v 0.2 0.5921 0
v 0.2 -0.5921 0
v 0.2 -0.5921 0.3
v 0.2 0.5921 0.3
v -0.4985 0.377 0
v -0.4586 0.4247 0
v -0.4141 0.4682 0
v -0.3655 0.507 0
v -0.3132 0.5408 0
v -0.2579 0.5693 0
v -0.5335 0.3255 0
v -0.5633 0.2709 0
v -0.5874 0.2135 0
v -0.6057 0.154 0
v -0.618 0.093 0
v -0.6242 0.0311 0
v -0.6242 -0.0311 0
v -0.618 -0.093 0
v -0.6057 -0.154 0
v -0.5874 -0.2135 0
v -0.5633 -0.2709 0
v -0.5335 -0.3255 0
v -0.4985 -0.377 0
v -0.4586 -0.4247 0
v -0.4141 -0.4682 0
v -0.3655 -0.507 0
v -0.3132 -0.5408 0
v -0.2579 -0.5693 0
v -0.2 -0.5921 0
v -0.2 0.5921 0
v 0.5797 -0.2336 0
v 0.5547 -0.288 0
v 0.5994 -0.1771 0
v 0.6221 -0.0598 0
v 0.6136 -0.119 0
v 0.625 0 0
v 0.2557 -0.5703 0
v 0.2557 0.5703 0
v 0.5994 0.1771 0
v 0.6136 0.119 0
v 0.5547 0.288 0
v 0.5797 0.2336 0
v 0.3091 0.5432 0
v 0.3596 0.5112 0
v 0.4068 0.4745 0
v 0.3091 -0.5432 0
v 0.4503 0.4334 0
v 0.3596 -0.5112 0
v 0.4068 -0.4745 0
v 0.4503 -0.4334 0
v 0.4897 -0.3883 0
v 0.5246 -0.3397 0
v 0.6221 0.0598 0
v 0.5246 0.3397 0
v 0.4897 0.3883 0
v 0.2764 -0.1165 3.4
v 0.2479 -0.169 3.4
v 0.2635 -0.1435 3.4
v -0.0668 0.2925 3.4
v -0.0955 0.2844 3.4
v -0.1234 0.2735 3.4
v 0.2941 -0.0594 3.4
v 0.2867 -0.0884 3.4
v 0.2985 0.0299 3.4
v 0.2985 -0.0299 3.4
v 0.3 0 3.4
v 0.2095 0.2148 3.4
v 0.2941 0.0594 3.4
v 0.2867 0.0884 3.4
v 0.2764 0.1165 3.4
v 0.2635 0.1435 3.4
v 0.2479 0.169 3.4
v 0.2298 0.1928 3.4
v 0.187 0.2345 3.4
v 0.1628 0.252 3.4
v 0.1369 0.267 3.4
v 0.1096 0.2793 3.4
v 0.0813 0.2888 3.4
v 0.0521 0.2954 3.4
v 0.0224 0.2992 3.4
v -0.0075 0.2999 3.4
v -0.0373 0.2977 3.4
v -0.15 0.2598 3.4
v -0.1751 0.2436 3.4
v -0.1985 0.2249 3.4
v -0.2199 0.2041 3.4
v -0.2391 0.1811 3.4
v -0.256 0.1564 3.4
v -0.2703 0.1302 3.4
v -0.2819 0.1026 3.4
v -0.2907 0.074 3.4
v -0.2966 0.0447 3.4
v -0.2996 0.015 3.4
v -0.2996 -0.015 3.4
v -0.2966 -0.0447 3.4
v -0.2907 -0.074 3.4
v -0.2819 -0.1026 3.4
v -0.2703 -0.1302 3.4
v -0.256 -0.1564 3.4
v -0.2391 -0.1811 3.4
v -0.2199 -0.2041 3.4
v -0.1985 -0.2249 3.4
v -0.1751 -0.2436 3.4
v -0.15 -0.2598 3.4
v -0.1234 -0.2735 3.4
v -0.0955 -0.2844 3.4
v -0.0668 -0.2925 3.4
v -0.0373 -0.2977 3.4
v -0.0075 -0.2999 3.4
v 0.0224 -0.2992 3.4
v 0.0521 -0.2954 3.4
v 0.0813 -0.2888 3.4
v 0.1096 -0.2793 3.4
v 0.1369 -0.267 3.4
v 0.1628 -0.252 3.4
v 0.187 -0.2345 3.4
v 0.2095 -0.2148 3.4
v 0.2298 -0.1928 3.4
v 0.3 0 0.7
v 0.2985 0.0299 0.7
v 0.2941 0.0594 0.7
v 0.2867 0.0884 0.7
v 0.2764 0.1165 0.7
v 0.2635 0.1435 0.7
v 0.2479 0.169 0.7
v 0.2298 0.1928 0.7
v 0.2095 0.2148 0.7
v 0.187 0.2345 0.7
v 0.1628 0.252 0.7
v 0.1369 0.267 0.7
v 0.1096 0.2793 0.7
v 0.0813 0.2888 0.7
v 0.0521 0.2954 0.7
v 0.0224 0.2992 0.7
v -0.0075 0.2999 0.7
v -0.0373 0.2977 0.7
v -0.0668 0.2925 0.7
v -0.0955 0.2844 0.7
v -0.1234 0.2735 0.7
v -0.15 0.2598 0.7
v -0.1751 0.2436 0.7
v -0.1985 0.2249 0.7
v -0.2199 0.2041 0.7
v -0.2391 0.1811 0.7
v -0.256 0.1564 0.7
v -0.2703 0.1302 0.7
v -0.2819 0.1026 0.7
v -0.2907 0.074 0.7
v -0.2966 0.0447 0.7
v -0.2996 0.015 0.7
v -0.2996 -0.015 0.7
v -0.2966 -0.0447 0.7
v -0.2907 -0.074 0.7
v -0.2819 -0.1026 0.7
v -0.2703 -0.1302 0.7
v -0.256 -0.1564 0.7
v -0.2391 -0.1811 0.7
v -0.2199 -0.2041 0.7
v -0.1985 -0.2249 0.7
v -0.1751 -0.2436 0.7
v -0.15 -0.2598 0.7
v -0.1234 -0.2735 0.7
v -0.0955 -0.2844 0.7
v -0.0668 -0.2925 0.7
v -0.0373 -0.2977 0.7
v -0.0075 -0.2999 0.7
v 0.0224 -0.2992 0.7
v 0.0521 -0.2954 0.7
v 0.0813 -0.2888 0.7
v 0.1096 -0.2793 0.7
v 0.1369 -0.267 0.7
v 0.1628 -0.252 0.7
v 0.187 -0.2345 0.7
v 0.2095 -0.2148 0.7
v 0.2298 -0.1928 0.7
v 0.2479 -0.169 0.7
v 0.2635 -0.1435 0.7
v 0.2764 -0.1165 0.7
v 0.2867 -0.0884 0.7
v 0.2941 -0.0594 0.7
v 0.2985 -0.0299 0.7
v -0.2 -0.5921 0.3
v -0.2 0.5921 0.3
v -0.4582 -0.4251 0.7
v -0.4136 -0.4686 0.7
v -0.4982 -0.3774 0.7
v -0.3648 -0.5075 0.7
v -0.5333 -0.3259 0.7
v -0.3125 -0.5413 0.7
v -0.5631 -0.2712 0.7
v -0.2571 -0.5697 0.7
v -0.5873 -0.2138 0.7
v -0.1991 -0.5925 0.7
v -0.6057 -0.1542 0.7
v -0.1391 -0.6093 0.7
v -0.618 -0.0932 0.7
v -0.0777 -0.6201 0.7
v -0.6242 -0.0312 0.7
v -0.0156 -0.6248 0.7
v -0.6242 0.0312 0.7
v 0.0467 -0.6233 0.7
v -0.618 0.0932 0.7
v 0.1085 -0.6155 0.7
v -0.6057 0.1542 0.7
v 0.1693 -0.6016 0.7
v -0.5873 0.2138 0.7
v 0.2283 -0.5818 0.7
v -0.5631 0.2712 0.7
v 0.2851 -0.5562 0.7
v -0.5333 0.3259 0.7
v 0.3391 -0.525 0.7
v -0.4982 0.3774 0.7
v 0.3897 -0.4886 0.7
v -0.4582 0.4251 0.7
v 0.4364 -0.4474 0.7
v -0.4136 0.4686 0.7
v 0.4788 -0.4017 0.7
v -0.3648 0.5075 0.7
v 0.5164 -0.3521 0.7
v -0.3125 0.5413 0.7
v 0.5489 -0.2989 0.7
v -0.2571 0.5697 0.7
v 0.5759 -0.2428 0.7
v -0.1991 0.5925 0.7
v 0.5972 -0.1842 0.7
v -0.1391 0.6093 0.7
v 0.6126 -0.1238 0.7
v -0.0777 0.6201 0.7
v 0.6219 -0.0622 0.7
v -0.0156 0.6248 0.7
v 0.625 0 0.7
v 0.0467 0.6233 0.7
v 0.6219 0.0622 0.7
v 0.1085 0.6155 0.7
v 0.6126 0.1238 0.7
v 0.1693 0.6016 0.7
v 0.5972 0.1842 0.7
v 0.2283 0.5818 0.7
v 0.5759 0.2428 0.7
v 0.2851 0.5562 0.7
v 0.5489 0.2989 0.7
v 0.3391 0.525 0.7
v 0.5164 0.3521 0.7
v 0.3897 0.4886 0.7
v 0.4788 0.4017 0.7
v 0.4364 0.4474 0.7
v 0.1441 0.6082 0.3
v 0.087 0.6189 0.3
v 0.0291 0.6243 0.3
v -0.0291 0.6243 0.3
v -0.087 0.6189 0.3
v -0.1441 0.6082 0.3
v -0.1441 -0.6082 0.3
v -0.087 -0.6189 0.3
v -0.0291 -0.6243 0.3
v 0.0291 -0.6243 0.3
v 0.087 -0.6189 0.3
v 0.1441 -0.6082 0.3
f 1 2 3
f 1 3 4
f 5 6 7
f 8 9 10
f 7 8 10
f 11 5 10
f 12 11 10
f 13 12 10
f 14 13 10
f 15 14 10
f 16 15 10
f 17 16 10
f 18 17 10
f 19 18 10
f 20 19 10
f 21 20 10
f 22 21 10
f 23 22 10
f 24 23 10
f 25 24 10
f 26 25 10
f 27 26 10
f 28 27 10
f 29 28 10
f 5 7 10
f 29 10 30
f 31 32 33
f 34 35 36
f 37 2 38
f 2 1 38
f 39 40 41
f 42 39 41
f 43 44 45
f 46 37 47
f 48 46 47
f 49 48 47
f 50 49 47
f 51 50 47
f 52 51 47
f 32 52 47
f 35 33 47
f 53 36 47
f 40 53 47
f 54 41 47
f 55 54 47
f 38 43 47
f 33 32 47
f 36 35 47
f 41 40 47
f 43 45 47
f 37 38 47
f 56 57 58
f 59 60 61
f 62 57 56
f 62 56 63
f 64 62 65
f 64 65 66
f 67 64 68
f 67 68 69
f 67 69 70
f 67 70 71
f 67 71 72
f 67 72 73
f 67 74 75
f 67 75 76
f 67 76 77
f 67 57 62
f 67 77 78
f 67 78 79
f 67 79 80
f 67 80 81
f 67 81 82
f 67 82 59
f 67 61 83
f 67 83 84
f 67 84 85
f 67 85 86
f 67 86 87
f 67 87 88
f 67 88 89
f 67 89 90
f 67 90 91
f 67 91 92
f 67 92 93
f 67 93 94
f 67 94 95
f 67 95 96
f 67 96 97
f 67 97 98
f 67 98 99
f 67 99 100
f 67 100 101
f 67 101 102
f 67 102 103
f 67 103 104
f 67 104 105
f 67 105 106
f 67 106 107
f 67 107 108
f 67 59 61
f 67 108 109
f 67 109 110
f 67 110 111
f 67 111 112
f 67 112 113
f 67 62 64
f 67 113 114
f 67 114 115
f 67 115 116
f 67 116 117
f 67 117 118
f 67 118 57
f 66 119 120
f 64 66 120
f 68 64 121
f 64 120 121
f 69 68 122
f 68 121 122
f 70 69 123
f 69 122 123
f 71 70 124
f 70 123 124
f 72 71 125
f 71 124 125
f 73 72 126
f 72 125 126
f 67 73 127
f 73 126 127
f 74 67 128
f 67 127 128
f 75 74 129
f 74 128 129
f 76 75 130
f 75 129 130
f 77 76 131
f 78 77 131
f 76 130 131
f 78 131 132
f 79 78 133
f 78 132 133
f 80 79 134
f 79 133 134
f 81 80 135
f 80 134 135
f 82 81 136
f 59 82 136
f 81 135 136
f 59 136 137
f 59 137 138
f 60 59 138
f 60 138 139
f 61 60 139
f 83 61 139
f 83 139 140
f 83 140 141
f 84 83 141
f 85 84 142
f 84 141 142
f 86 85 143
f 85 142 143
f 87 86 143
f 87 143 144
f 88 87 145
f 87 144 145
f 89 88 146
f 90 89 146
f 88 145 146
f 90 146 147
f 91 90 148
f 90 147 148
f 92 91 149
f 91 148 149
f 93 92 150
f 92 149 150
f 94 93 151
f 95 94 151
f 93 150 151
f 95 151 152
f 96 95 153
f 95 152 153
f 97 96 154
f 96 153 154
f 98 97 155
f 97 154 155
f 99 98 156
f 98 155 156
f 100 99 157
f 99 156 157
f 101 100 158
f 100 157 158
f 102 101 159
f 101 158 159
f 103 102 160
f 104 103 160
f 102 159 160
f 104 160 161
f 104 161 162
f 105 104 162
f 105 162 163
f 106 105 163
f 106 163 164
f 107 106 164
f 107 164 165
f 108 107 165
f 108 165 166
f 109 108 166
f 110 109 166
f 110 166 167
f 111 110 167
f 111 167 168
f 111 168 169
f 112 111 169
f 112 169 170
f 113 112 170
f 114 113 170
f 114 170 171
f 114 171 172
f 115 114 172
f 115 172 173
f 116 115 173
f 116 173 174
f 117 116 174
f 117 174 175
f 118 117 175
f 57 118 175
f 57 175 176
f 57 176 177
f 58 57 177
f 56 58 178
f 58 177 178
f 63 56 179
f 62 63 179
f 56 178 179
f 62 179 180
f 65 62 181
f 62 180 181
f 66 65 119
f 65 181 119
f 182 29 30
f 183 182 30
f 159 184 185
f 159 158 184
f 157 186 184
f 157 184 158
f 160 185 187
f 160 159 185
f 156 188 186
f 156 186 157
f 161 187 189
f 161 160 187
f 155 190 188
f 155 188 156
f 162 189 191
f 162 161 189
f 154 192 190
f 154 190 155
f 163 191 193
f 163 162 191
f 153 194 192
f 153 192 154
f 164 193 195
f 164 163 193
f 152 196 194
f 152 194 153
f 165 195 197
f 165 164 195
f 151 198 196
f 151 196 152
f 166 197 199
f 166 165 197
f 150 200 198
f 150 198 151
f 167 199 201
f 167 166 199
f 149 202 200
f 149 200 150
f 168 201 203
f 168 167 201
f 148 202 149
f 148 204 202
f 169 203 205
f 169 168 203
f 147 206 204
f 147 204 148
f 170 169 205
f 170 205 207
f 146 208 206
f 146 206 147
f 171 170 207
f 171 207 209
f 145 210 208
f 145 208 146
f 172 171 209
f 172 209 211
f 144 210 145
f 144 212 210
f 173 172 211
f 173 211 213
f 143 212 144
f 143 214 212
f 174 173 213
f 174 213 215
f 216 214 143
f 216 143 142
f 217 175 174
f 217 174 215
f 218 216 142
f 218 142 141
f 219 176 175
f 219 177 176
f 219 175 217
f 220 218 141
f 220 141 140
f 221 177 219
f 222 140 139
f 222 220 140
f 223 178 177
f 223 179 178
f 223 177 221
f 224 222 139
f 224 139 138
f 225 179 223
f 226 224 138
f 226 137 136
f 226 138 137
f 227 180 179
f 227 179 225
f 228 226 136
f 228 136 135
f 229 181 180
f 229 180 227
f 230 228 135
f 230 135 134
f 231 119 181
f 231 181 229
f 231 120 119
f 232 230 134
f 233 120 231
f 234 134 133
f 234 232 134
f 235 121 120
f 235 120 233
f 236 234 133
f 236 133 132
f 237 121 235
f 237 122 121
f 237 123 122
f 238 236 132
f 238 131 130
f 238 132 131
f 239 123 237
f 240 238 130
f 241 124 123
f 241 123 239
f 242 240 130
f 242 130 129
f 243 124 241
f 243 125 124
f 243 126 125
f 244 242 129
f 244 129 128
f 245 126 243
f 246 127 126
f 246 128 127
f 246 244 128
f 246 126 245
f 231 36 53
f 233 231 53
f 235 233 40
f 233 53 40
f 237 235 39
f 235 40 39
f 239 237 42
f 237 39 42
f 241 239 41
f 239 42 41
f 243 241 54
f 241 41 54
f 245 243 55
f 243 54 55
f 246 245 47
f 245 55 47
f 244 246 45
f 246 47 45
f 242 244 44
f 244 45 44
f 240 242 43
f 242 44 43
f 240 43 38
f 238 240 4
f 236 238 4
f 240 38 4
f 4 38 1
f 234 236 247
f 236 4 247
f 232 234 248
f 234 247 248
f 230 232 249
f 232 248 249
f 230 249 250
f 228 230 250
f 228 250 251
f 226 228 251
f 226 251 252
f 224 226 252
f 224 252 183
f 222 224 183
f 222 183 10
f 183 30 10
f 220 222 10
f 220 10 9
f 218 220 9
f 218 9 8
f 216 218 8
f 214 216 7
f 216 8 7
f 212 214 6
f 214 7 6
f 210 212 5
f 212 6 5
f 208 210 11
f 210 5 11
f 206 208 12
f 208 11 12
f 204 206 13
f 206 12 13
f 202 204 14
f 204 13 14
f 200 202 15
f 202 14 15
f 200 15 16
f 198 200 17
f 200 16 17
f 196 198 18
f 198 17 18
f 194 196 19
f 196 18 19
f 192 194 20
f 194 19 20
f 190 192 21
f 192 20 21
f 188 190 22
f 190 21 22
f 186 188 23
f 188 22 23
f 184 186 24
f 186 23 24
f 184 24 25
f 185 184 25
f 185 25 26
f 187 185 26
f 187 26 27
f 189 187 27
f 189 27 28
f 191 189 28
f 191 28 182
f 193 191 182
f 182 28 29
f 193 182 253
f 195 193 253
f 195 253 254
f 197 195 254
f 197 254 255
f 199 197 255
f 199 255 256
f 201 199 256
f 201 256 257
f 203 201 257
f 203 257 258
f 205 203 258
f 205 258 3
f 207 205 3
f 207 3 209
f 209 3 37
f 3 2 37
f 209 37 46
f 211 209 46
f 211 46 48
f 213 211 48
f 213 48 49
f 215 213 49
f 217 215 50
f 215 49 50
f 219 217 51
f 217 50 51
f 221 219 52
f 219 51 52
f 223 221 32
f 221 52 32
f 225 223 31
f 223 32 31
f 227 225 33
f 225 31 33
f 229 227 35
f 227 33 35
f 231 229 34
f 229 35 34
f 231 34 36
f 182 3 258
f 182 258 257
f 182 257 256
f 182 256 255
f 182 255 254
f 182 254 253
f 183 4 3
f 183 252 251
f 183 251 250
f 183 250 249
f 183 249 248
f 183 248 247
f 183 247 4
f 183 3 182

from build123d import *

# Parameters (mm, degrees)
SKETCH1_R           = 0.625
BOSS_EXTRUDE1_DEPTH = 0.7
SKETCH3_R           = 0.3
BOSS_EXTRUDE2_DEPTH = 2.7
SKETCH5_W           = 0.4
SKETCH5_H           = 2
CUT_EXTRUDE1_DEPTH  = 0.3


with BuildPart() as part:
    # Sketch1 → Boss-Extrude1 (new body)
    with BuildSketch(Plane.XY):
        Circle(SKETCH1_R)
    extrude(amount=BOSS_EXTRUDE1_DEPTH)

    # Sketch3 → Boss-Extrude2 (add)
    with BuildSketch(Plane.XY.offset(0.7)):
        Circle(SKETCH3_R)
    extrude(amount=BOSS_EXTRUDE2_DEPTH)

    # Sketch5 → Cut-Extrude1 (cut)
    with BuildSketch(Plane(origin=(0, 0, 0), x_dir=(-1, 0, 0), z_dir=(0, 0, -1))):
        Rectangle(SKETCH5_W, SKETCH5_H)
    extrude(amount=-CUT_EXTRUDE1_DEPTH, mode=Mode.SUBTRACT)


solid = part.part
